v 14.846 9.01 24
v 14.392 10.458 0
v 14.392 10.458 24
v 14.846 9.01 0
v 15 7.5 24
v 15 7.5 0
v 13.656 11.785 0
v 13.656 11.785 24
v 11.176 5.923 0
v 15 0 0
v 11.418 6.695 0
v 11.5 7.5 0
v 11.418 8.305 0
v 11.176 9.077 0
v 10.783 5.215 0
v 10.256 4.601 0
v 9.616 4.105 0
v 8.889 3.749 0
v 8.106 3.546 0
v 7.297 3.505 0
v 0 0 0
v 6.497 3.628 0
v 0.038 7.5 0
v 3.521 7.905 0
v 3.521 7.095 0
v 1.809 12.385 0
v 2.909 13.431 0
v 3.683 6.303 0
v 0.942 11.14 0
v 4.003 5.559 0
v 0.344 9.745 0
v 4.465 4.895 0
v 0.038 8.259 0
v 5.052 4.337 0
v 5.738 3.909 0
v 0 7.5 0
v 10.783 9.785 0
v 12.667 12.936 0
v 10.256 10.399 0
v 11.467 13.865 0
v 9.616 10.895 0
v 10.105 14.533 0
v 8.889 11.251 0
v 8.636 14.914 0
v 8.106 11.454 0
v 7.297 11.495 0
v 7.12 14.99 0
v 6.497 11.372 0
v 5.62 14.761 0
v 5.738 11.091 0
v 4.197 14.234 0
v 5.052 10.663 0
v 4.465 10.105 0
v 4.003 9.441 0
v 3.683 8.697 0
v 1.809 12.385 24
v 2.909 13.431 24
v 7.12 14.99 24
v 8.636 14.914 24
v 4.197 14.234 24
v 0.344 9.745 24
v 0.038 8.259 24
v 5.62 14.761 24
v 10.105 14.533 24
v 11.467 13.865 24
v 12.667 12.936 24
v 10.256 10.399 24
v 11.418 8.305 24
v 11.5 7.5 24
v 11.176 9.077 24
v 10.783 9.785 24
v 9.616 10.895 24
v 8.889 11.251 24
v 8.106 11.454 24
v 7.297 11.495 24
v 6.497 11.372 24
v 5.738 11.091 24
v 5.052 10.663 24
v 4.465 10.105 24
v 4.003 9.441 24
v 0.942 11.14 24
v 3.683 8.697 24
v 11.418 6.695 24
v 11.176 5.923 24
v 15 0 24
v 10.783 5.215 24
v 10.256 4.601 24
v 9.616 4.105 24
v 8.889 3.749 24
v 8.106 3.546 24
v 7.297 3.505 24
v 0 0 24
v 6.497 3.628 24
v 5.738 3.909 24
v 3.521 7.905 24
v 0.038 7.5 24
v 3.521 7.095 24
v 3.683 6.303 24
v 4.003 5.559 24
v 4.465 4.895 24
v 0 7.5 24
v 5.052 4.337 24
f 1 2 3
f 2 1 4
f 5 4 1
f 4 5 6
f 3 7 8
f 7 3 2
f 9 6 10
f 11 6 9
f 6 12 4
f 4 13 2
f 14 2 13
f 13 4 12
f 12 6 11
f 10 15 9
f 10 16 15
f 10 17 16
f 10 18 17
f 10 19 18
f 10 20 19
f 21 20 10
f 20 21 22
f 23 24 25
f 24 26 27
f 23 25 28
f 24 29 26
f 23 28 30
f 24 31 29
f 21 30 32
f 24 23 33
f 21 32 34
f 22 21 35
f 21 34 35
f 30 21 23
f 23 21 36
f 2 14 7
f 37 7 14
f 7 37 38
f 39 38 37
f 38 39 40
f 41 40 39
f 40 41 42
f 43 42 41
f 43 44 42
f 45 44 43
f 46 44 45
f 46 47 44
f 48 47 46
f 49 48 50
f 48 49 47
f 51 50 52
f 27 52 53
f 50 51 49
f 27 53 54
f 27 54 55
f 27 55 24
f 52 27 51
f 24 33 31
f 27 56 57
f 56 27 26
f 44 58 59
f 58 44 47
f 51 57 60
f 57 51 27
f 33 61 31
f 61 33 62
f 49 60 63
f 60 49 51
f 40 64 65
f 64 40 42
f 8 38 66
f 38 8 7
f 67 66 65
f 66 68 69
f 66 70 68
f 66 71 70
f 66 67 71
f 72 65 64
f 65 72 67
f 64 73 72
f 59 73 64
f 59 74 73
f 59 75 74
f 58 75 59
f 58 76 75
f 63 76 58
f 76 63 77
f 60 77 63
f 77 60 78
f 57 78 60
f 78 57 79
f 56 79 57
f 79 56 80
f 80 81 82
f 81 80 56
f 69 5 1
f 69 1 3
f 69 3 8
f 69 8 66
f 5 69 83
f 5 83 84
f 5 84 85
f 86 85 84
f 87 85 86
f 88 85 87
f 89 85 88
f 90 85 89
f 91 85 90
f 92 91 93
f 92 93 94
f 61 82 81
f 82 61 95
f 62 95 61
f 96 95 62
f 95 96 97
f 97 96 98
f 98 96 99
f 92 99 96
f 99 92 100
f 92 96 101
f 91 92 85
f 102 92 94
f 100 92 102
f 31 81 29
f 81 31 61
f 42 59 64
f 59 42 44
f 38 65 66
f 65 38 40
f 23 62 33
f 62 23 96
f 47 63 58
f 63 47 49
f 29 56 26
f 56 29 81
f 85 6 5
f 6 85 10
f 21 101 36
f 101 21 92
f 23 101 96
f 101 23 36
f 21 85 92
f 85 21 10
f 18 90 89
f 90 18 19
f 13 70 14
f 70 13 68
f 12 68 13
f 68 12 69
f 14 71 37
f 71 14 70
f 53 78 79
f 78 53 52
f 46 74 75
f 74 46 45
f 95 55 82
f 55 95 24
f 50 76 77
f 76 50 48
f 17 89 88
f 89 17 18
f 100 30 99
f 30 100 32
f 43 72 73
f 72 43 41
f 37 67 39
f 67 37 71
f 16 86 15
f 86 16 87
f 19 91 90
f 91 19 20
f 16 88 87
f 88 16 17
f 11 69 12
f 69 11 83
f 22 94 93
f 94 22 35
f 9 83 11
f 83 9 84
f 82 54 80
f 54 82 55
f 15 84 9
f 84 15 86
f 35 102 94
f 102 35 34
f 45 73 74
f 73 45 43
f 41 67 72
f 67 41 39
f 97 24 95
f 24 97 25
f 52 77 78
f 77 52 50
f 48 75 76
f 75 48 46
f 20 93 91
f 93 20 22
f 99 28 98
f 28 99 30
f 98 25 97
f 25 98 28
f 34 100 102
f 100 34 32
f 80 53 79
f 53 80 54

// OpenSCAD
// file: config.scad
// This is the config for an M8 Mendel sized printer.

buildx = 200; //build area on the x axis
buildy = 200; //build area on the y axis
buildz = 120; //build area on the z axis

frameroddia = 9; //the frame rod diameter
smoothroddia = 8; //the smooth rod diameter
bushingod = 15; //The prusabushing OD, you can change this to 15 to use LM8UU linear bearings 
bushingheight = 24; 

nemasize = 1.7; //Nema Size TODO just make this 17, 23,14 etc
motorcenter = 23; //center hole size for the motor mount. If your motor center flange is smaller you can beef up parts this way. 
motorshaftdia = 5; // Motor shaft diameter
motorshaftlength = 22;
motorbody = 43;

pulleypitch = 5; //trapezoidal pulley script TODO
pulleyteeth = 8; 
beltwidth = 6; // Belt width 

/* The Mixtape Mendel uses two types of fasteners. One is the "primary" type, which is the larger type that builds the structure,
 which was profiled above as "frameroddia, etc..". In the case of the Mendel, it is M8 threaded rod (Huxley, M6). It also uses "Secondary" hardware. This is a smaller screw which normally corerelates with the motor screw used.
*/
nutheight = 7; //Primary
nutapothem = 13; //Primary nut apothem (wrench size)

secscrewdia = 4; //secondary 
secscrewheaddia = 6; //secondary screw head diameter
secscrewheadheight = 3; //secondary screw head height
secnutapothem = 5.5; //secondary nut apothem (wrench size)
secnutheight = 2.4; //secondary

zipheight = 2; //ziptie height
zipwidth = 4; //ziptie width

mdfthick = 6; //thickness of MDF (You can use other wood, acrylic, lexan, etc)

bearingid = 8; // 608
bearingod = 22; // 608
bearinginnerrace = 12; // the amount of the inner race diameter exposed

layerheight = 0.32; //skeinforge/slicer layer height, used for the idler wasers right now. 

//Groove Mount
	//Default is pretty good for MakerGear insulators
groovedia = 12;
grooveheight = 4.5;



/*
Below here are reworld correlations based on user specified input above and constants.
*/

//belt thickness
beltthick = (pulleypitch == 5) ? 2.2 : (pulleypitch == 5.08) ? 2.3 : (pulleypitch == 2.5) ? 1.3 : 1.14;
//XL = 2.3
//MXL = 1.14
//T2.5 = 1.3
//T5 = 2.2

pi = 3.141592654;
// main file
/*
  Mixtape Mendel - A Fully Parametric RepRap
    Copyright (C) 2011  Steve Kelly

    This program is free software: you can redistribute it and/or modify
    it under the terms of the GNU General Public License as published by
    the Free Software Foundation, either version 3 of the License, or
    (at your option) any later version.

    This program is distributed in the hope that it will be useful,
    but WITHOUT ANY WARRANTY; without even the implied warranty of
    MERCHANTABILITY or FITNESS FOR A PARTICULAR PURPOSE.  See the
    GNU General Public License for more details.

    You should have received a copy of the GNU General Public License
    along with this program.  If not, see <http://www.gnu.org/licenses/>.
*/

include <config.scad>;
$fn = 31;

	difference(){
		
		union(){

		//make the bushing outer bits
		translate([bushingod/2,bushingod/2,0])cylinder(r=bushingod/2, h = bushingheight);
		cube([bushingod,bushingod/2,bushingheight]);	

		}

		//subtract the smooth rod diameter
		translate([bushingod/2,bushingod/2,-1])cylinder(r=smoothroddia/2, h = bushingheight+2);

	}
